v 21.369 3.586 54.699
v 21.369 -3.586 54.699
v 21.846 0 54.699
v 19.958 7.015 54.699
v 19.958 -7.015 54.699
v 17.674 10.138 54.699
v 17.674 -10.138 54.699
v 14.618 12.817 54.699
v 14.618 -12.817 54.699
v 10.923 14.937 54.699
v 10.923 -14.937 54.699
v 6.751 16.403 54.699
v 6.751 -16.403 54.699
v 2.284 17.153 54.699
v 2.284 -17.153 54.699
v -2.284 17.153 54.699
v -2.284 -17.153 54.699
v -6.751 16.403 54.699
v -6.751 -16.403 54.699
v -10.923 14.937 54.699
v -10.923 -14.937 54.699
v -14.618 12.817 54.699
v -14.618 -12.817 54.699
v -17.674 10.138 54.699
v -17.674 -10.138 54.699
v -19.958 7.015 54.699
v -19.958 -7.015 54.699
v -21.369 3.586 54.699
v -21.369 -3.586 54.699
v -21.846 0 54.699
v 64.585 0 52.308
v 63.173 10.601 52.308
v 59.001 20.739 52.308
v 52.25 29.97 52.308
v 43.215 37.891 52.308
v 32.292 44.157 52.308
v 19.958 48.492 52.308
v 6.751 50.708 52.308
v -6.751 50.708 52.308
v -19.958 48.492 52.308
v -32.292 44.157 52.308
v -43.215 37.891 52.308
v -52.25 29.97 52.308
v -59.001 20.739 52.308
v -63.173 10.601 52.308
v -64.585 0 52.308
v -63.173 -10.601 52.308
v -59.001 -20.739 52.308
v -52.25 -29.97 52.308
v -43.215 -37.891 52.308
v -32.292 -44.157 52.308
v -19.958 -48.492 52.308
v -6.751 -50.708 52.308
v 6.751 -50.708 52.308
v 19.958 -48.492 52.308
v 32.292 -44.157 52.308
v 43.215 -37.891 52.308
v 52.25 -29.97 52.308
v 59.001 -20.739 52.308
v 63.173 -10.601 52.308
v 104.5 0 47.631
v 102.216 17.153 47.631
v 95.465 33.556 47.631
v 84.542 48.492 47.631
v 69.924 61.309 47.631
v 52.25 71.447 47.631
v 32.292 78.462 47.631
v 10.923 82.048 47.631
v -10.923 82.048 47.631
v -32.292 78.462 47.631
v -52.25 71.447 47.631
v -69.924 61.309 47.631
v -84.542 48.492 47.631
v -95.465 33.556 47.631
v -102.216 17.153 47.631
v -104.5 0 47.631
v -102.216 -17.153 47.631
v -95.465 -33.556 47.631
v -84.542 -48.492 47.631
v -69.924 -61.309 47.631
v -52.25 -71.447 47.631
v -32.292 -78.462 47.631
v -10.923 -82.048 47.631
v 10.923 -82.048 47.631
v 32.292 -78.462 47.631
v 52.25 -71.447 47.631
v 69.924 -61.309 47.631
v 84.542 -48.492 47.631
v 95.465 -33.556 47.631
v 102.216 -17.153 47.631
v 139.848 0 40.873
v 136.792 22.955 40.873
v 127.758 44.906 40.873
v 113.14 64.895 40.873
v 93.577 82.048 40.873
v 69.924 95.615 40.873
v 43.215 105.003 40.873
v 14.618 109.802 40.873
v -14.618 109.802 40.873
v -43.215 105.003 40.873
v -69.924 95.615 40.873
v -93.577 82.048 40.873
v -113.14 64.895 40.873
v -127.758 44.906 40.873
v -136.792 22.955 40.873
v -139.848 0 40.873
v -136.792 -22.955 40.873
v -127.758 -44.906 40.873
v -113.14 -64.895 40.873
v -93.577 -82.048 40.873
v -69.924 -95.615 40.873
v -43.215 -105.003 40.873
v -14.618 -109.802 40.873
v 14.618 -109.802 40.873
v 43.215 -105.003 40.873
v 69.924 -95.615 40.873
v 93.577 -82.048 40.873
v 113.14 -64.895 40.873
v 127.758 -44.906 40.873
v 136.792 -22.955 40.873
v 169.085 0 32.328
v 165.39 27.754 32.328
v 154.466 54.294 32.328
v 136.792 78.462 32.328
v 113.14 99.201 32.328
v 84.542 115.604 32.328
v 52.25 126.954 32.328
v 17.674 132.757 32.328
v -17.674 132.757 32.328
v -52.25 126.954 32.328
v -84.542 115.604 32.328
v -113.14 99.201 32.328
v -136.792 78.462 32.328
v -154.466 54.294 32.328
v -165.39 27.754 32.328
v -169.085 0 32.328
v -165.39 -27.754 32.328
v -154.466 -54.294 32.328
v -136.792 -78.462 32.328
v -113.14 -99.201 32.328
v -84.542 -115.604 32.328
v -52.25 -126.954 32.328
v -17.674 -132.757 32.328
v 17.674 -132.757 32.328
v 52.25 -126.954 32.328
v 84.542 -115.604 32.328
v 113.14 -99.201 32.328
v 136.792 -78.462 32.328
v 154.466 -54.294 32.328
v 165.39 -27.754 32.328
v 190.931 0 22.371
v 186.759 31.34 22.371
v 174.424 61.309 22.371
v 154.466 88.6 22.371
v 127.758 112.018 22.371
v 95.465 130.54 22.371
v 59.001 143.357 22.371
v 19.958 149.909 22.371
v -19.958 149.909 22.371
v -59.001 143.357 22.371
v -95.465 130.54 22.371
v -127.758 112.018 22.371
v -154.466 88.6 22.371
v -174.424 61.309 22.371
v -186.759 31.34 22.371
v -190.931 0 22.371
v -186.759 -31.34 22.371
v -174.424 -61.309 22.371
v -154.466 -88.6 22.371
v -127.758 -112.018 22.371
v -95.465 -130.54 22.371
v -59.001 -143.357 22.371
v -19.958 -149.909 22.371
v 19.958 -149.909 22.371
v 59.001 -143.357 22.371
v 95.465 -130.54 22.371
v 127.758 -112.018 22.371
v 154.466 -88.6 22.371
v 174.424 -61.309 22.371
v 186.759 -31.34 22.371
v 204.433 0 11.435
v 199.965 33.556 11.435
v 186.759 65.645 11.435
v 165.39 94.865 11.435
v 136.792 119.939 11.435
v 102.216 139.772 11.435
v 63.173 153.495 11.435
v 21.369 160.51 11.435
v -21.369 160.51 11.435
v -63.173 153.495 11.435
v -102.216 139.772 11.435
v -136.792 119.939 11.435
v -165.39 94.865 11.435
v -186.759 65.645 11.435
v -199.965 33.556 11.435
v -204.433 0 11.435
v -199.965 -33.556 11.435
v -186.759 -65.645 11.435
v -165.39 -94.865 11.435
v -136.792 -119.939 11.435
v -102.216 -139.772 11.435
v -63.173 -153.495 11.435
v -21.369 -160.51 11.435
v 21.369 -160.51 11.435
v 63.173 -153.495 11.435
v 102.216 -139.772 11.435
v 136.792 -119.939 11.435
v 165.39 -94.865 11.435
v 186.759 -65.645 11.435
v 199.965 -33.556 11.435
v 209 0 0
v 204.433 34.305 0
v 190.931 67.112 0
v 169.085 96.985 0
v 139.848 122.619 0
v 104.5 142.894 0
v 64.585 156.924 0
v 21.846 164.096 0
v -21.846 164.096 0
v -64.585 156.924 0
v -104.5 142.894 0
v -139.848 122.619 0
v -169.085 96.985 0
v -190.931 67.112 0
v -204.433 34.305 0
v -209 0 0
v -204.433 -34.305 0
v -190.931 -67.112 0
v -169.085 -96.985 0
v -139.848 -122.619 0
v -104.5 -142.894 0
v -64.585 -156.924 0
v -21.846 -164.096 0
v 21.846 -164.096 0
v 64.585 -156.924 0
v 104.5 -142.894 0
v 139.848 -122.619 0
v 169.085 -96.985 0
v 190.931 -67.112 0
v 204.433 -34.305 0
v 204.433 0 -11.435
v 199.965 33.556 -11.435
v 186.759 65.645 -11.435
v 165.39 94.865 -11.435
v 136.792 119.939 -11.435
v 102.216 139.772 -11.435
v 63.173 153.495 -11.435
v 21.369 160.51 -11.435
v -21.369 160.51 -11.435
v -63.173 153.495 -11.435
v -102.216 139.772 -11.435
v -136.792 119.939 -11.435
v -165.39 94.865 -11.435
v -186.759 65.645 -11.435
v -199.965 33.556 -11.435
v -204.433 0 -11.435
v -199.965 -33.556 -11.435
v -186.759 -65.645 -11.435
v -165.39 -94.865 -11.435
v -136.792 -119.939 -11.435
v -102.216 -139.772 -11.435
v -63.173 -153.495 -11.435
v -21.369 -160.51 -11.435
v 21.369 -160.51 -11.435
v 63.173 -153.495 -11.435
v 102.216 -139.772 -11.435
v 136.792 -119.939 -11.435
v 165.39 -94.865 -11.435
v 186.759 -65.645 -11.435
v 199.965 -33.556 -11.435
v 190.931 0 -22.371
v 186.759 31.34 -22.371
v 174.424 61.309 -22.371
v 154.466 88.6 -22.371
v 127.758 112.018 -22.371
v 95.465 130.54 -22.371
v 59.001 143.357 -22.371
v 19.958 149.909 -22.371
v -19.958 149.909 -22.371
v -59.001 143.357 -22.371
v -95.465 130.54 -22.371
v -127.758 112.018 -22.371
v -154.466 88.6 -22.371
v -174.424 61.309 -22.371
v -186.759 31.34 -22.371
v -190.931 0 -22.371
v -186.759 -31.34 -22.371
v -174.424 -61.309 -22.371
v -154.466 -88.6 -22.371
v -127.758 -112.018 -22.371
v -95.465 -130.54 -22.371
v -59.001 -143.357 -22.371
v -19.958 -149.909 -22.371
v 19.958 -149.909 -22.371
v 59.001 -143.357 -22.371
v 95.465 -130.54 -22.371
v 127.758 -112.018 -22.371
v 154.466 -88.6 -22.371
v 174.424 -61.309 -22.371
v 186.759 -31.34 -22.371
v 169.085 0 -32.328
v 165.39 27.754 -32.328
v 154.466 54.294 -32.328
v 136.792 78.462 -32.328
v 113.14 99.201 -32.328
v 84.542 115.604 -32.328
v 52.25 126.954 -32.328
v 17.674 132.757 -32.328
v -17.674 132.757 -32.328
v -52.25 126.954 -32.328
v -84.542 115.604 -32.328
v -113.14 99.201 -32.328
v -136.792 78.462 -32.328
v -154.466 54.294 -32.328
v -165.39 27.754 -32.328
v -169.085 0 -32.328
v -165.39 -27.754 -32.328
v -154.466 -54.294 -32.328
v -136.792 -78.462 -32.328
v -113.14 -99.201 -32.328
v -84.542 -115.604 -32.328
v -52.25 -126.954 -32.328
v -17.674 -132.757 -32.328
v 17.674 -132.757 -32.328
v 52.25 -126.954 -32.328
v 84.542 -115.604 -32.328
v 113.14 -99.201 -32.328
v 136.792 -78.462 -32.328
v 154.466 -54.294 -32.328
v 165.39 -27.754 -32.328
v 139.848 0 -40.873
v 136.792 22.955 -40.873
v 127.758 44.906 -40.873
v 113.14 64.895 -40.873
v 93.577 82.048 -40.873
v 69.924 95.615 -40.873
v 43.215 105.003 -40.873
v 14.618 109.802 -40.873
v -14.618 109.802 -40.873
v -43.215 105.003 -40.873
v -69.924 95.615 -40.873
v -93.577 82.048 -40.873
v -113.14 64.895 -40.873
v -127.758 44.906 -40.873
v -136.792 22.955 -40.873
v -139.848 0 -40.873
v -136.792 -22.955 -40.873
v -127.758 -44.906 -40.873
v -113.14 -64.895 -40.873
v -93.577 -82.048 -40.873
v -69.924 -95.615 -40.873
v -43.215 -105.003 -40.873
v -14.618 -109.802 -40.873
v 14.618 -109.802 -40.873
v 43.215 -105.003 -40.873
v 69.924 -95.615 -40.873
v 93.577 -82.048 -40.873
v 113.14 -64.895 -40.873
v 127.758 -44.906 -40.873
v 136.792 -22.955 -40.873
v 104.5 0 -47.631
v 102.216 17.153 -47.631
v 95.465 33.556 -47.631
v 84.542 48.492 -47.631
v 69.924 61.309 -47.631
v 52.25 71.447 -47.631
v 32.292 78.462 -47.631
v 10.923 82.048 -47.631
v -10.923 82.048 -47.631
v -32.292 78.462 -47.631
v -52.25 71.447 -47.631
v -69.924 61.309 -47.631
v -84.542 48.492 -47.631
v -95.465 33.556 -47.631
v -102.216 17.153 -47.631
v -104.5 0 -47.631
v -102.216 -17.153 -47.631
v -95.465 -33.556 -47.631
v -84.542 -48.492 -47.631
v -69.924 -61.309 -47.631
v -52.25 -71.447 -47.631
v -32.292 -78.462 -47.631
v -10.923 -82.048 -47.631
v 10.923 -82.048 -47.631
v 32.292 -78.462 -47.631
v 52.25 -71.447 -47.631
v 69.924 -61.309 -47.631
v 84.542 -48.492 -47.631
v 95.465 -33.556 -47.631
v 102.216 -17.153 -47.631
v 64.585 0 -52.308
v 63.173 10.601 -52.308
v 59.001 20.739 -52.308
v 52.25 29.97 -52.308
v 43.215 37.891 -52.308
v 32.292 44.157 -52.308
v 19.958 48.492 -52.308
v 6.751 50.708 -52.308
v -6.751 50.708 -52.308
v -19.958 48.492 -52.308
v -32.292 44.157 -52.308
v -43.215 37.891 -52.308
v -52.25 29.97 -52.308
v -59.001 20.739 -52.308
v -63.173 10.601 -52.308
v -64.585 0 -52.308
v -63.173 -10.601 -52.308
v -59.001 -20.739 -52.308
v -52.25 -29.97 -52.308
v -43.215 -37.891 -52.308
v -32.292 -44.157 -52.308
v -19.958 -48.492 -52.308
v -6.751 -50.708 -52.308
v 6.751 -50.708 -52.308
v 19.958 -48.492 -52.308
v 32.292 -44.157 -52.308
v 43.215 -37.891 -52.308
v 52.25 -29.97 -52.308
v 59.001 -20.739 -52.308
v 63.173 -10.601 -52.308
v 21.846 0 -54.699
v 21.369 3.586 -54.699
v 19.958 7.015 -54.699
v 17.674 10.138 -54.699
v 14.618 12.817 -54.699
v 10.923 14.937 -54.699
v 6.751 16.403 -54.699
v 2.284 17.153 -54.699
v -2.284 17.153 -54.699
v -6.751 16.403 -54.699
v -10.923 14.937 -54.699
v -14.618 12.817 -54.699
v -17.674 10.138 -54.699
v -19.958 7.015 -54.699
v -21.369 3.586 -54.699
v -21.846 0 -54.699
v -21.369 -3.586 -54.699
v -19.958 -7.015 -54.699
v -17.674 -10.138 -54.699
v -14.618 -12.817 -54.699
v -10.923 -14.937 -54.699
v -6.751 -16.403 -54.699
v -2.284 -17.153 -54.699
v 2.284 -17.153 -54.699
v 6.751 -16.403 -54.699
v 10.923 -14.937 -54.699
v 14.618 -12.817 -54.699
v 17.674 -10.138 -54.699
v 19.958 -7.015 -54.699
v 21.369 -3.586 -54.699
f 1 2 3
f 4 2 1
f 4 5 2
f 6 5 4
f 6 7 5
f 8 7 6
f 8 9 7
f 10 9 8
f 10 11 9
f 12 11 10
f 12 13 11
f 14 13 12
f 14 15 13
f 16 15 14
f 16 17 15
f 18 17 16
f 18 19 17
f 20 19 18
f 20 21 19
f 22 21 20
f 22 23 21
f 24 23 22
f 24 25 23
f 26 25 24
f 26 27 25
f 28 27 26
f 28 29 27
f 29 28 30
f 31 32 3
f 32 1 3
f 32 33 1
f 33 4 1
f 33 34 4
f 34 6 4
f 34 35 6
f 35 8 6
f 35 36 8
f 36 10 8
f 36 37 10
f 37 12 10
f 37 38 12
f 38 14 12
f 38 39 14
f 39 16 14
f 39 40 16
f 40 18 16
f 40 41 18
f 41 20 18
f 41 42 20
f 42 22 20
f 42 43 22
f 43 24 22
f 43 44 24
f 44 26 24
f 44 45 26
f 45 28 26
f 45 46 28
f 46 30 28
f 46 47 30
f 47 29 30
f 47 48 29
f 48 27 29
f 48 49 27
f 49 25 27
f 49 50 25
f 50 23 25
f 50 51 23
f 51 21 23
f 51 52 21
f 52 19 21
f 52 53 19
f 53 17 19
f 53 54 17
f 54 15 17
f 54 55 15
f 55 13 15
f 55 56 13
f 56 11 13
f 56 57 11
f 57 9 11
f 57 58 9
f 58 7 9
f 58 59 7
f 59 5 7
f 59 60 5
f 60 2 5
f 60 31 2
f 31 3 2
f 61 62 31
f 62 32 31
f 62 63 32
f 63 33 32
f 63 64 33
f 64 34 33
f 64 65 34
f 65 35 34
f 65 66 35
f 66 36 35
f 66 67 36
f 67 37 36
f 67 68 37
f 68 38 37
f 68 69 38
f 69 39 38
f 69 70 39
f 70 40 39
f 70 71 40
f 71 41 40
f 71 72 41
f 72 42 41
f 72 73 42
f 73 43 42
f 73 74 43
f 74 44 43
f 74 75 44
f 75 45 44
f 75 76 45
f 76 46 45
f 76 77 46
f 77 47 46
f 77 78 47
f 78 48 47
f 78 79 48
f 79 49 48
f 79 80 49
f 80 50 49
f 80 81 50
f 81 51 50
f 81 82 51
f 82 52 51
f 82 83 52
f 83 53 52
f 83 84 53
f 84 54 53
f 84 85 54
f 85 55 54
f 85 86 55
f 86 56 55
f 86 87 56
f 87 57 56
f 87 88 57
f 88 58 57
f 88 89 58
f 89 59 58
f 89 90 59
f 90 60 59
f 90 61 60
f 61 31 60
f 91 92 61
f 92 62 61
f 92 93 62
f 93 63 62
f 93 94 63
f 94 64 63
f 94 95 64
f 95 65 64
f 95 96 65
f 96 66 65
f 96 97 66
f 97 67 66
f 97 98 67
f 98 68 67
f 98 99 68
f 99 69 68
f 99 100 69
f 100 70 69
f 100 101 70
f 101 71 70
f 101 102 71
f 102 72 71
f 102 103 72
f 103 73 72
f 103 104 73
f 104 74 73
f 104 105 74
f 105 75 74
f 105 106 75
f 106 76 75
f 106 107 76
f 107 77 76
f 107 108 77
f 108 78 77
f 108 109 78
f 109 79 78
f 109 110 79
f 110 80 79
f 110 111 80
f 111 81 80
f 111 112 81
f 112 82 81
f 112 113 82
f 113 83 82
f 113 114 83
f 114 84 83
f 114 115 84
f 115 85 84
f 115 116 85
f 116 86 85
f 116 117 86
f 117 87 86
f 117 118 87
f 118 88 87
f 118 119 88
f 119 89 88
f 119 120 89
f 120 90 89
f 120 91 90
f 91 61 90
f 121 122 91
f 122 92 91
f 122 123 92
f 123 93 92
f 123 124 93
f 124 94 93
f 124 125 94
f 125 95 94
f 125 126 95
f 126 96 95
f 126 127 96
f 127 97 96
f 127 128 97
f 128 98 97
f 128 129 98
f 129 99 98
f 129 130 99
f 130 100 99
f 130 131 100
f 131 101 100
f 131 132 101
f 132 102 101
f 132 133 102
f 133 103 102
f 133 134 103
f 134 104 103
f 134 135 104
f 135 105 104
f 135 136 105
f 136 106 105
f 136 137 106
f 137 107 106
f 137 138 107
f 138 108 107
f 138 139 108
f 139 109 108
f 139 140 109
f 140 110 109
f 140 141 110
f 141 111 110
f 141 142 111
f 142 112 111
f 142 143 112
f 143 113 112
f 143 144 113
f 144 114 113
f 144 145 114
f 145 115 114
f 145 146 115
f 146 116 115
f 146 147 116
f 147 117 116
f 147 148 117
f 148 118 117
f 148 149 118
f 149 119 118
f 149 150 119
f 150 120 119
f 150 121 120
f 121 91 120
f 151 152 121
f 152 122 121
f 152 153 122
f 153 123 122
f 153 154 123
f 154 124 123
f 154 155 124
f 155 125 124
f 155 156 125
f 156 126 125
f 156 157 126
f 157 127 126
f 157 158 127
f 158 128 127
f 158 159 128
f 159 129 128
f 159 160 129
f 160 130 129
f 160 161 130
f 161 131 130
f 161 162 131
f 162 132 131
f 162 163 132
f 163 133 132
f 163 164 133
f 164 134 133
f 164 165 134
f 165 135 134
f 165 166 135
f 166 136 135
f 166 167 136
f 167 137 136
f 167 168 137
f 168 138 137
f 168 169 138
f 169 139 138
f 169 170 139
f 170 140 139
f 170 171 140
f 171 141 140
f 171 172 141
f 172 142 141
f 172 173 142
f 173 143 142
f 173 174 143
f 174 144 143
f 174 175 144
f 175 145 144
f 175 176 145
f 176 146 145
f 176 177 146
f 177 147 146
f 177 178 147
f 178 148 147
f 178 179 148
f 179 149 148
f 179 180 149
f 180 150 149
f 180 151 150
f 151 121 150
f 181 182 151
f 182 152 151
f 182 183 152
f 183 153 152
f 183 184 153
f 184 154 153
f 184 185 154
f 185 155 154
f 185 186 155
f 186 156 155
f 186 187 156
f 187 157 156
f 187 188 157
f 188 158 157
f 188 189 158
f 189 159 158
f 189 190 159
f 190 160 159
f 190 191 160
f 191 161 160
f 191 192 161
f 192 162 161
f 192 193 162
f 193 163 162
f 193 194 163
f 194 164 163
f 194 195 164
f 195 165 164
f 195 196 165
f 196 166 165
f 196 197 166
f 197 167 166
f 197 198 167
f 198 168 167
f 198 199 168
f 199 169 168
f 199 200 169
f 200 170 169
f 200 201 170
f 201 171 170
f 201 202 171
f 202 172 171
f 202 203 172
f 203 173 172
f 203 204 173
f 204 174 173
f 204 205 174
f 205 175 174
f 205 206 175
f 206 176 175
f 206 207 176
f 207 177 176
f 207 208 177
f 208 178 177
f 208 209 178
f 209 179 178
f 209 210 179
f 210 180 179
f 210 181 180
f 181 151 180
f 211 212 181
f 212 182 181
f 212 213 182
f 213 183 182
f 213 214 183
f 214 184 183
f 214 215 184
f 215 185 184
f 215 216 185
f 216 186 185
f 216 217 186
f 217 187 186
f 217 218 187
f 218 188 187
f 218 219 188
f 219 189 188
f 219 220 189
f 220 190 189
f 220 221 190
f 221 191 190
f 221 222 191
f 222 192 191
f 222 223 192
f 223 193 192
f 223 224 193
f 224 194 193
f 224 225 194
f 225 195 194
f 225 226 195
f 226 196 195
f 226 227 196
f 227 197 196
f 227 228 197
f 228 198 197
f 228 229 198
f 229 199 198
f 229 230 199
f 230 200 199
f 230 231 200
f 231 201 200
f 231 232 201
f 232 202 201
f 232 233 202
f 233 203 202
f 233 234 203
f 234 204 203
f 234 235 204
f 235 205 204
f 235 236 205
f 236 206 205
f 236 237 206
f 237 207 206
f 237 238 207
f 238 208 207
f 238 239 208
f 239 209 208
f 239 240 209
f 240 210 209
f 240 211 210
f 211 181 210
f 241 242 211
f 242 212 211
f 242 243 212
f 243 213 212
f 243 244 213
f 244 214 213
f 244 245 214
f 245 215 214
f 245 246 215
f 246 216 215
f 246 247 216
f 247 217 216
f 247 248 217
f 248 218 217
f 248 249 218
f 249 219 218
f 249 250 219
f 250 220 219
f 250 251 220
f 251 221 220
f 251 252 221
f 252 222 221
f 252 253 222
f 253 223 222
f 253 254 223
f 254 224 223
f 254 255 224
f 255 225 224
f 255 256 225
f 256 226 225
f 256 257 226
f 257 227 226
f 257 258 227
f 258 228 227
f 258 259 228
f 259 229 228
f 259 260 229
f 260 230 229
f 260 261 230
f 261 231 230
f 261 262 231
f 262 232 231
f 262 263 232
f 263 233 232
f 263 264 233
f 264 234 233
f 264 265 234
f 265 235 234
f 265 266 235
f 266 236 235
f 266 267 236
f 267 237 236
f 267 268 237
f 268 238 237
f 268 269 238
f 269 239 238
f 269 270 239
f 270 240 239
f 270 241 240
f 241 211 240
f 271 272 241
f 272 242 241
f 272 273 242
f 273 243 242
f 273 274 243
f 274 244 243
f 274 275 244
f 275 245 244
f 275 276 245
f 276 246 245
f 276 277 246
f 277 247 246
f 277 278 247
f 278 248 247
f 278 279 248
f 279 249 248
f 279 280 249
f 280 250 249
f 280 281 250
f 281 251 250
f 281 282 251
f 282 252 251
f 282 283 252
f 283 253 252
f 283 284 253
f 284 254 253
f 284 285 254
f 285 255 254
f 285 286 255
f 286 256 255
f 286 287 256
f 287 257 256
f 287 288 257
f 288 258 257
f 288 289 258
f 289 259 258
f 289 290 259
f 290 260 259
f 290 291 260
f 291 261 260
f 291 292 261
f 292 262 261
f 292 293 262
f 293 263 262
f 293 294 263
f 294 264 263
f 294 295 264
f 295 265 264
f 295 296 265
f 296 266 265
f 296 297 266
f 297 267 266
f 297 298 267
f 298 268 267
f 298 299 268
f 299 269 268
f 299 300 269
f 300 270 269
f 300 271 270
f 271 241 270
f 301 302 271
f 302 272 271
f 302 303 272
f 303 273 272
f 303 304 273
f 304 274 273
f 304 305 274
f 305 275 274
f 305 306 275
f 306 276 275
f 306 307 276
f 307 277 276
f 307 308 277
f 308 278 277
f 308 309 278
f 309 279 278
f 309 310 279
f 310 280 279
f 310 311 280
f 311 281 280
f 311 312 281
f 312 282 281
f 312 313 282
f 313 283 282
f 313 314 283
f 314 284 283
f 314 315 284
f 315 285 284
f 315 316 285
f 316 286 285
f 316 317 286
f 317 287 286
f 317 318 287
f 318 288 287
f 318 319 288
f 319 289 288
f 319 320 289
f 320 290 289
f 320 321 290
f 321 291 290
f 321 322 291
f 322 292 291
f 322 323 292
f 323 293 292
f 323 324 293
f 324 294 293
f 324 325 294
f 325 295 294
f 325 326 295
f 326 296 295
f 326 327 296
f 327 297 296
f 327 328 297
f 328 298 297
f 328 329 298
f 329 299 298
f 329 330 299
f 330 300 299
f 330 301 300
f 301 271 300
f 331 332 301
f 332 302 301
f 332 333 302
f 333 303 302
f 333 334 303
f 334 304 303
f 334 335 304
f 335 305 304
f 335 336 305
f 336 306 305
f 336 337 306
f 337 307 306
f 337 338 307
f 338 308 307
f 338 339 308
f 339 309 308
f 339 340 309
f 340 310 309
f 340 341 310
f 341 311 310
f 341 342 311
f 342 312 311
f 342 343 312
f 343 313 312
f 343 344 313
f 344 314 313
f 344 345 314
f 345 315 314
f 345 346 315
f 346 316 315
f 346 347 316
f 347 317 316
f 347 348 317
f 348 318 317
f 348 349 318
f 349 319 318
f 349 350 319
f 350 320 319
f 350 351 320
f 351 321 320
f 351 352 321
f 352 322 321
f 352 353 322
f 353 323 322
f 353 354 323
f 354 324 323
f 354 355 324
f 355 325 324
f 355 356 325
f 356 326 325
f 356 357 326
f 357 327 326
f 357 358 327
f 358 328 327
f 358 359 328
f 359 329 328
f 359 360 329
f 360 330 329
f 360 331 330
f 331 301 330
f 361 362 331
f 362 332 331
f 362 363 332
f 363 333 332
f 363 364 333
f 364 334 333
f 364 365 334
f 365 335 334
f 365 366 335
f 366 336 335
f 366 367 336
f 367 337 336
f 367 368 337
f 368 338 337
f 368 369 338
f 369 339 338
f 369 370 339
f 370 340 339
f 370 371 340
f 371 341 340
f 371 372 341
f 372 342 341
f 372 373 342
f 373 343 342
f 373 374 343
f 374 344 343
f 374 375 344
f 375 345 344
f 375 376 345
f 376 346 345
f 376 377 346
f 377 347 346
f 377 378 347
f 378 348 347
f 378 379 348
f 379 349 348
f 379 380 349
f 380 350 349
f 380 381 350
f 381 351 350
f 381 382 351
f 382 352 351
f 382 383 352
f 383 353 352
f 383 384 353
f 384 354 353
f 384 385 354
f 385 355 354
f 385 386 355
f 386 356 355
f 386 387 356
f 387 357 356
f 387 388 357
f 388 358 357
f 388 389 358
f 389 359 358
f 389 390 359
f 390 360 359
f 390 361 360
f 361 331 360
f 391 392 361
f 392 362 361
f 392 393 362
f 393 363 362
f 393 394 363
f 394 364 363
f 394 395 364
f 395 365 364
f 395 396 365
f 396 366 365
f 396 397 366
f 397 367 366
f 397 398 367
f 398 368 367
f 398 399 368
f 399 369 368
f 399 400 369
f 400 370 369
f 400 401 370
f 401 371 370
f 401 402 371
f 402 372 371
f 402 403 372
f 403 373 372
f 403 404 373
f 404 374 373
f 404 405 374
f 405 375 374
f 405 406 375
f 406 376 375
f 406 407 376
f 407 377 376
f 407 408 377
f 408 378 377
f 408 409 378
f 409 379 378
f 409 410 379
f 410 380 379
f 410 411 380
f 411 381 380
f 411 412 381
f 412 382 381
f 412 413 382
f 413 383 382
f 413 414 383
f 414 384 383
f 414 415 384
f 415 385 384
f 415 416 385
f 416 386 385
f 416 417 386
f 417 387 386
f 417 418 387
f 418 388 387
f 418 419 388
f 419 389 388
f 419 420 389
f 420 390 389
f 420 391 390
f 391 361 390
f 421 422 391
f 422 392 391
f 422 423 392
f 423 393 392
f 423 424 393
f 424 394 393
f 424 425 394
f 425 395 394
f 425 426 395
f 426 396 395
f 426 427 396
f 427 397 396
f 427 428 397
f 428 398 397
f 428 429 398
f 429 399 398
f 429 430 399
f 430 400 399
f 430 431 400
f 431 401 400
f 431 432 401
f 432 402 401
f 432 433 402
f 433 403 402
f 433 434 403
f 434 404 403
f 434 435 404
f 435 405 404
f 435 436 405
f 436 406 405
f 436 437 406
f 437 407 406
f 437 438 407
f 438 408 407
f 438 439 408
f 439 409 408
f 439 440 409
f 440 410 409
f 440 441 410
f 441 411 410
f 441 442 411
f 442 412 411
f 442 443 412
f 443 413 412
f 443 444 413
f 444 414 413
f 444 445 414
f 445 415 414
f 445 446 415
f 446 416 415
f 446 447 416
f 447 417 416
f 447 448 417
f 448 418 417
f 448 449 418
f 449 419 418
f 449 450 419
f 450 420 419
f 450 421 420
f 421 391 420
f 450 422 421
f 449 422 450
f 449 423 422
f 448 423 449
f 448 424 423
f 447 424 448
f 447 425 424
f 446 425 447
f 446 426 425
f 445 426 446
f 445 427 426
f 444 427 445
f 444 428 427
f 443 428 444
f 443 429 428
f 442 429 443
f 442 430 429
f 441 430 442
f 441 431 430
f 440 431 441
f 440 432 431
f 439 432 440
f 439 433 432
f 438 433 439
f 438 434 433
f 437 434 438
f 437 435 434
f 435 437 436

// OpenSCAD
// Generated by SolidPython 1.0.1 on 2020-07-29 00:46:54


scale(v = [19, 15, 5]) {
	sphere(r = 11);
}
/***********************************************
*********      SolidPython code:      **********
************************************************
 
# import packages: SolidPython
from solid import *
from solid.utils import *
from itertools import chain, combinations, permutations


class Resize:

    def __init__(self, scad_file):
        self.scad_file = scad_file
        #self.scad_file = import_scad(scad_file)
        # cone/cylinder param:
        self.r1 = 0
        self.r2 = 0
        self.h = 0
        # rectangular prism param:
        self.w = 0
        self.l = 0
        # ellipse param:
        self.r = 0

    # import OpenScad code (file name corresponds to shape)


    # classify shape + parameters
    def assign(self, param1, param2, param3):
        if self.scad_file == 'cone.scad':
            self.r1 = param1
            self.r2 = param2
            self.h = param3
        elif self.scad_file == 'cylinder.scad':
            self.r1 = param1
            self.r2 = param2
            self.h = param3
        elif self.scad_file == 'rectangularPrism.scad':
            self.h = param1
            self.l = param2
            self.w = param3
        else:
            self.r = param1
            self.h = param2

    # resize parameters
    def iterate(self):
        x = range(3, 20, 2)
        i = 1
        if self.scad_file == 'cone.scad':
            tempList = list(permutations(x, 2))
            for temp in tempList:
                param1 = temp[0]
                param2 = temp[1]
                filepath = 'produced_scad_files/' + 'cone' + str(param1) + '_' + str(param2) + '_' + '.scad'
                scad_render_to_file(cylinder(h=param1, r1=param2, r2=0), filepath)

        elif self.scad_file == 'cylinder.scad':
            tempList = list(permutations(x, 3))
            for temp in tempList:
                param1 = temp[0]
                param2 = temp[1]
                filepath = 'produced_scad_files/' + 'cylinder' + str(param1) + '_' + str(param2) + '_' + '.scad'
                scad_render_to_file(cylinder(h=param1, r1=param2, r2=param2), filepath)

        elif self.scad_file == 'rectangularPrism.scad':
            tempList = list(permutations(x, 3))
            for temp in tempList:
                param1 = temp[0]
                param2 = temp[1]
                param3 = temp[2]
                filepath = 'produced_scad_files/' + 'rectangularPrism' + str(param1) + '_' + str(param2) + '_' + str(
                    param3) + '.scad'
                scad_render_to_file(cube(size=(param1, param2, param3)), filepath)

        elif self.scad_file == 'ellipse.scad':
            tempList = list(permutations(x, 4))
            for temp in tempList:
                param1 = temp[0]
                param2 = temp[1]
                param3 = temp[2]
                param4 = temp[3]
                filepath = 'produced_scad_files/' + 'ellipse' + str(param1) + '_' + str(param2) + '_' + str(param3) + '_' + str(param4) + '.scad'
                scad_render_to_file(scale([param1, param2, param3])(sphere(r=param4)), filepath)

    def render_to_scadfile(self):
        scad_render_to_file(scad, 'example.scad') 
 
************************************************/
